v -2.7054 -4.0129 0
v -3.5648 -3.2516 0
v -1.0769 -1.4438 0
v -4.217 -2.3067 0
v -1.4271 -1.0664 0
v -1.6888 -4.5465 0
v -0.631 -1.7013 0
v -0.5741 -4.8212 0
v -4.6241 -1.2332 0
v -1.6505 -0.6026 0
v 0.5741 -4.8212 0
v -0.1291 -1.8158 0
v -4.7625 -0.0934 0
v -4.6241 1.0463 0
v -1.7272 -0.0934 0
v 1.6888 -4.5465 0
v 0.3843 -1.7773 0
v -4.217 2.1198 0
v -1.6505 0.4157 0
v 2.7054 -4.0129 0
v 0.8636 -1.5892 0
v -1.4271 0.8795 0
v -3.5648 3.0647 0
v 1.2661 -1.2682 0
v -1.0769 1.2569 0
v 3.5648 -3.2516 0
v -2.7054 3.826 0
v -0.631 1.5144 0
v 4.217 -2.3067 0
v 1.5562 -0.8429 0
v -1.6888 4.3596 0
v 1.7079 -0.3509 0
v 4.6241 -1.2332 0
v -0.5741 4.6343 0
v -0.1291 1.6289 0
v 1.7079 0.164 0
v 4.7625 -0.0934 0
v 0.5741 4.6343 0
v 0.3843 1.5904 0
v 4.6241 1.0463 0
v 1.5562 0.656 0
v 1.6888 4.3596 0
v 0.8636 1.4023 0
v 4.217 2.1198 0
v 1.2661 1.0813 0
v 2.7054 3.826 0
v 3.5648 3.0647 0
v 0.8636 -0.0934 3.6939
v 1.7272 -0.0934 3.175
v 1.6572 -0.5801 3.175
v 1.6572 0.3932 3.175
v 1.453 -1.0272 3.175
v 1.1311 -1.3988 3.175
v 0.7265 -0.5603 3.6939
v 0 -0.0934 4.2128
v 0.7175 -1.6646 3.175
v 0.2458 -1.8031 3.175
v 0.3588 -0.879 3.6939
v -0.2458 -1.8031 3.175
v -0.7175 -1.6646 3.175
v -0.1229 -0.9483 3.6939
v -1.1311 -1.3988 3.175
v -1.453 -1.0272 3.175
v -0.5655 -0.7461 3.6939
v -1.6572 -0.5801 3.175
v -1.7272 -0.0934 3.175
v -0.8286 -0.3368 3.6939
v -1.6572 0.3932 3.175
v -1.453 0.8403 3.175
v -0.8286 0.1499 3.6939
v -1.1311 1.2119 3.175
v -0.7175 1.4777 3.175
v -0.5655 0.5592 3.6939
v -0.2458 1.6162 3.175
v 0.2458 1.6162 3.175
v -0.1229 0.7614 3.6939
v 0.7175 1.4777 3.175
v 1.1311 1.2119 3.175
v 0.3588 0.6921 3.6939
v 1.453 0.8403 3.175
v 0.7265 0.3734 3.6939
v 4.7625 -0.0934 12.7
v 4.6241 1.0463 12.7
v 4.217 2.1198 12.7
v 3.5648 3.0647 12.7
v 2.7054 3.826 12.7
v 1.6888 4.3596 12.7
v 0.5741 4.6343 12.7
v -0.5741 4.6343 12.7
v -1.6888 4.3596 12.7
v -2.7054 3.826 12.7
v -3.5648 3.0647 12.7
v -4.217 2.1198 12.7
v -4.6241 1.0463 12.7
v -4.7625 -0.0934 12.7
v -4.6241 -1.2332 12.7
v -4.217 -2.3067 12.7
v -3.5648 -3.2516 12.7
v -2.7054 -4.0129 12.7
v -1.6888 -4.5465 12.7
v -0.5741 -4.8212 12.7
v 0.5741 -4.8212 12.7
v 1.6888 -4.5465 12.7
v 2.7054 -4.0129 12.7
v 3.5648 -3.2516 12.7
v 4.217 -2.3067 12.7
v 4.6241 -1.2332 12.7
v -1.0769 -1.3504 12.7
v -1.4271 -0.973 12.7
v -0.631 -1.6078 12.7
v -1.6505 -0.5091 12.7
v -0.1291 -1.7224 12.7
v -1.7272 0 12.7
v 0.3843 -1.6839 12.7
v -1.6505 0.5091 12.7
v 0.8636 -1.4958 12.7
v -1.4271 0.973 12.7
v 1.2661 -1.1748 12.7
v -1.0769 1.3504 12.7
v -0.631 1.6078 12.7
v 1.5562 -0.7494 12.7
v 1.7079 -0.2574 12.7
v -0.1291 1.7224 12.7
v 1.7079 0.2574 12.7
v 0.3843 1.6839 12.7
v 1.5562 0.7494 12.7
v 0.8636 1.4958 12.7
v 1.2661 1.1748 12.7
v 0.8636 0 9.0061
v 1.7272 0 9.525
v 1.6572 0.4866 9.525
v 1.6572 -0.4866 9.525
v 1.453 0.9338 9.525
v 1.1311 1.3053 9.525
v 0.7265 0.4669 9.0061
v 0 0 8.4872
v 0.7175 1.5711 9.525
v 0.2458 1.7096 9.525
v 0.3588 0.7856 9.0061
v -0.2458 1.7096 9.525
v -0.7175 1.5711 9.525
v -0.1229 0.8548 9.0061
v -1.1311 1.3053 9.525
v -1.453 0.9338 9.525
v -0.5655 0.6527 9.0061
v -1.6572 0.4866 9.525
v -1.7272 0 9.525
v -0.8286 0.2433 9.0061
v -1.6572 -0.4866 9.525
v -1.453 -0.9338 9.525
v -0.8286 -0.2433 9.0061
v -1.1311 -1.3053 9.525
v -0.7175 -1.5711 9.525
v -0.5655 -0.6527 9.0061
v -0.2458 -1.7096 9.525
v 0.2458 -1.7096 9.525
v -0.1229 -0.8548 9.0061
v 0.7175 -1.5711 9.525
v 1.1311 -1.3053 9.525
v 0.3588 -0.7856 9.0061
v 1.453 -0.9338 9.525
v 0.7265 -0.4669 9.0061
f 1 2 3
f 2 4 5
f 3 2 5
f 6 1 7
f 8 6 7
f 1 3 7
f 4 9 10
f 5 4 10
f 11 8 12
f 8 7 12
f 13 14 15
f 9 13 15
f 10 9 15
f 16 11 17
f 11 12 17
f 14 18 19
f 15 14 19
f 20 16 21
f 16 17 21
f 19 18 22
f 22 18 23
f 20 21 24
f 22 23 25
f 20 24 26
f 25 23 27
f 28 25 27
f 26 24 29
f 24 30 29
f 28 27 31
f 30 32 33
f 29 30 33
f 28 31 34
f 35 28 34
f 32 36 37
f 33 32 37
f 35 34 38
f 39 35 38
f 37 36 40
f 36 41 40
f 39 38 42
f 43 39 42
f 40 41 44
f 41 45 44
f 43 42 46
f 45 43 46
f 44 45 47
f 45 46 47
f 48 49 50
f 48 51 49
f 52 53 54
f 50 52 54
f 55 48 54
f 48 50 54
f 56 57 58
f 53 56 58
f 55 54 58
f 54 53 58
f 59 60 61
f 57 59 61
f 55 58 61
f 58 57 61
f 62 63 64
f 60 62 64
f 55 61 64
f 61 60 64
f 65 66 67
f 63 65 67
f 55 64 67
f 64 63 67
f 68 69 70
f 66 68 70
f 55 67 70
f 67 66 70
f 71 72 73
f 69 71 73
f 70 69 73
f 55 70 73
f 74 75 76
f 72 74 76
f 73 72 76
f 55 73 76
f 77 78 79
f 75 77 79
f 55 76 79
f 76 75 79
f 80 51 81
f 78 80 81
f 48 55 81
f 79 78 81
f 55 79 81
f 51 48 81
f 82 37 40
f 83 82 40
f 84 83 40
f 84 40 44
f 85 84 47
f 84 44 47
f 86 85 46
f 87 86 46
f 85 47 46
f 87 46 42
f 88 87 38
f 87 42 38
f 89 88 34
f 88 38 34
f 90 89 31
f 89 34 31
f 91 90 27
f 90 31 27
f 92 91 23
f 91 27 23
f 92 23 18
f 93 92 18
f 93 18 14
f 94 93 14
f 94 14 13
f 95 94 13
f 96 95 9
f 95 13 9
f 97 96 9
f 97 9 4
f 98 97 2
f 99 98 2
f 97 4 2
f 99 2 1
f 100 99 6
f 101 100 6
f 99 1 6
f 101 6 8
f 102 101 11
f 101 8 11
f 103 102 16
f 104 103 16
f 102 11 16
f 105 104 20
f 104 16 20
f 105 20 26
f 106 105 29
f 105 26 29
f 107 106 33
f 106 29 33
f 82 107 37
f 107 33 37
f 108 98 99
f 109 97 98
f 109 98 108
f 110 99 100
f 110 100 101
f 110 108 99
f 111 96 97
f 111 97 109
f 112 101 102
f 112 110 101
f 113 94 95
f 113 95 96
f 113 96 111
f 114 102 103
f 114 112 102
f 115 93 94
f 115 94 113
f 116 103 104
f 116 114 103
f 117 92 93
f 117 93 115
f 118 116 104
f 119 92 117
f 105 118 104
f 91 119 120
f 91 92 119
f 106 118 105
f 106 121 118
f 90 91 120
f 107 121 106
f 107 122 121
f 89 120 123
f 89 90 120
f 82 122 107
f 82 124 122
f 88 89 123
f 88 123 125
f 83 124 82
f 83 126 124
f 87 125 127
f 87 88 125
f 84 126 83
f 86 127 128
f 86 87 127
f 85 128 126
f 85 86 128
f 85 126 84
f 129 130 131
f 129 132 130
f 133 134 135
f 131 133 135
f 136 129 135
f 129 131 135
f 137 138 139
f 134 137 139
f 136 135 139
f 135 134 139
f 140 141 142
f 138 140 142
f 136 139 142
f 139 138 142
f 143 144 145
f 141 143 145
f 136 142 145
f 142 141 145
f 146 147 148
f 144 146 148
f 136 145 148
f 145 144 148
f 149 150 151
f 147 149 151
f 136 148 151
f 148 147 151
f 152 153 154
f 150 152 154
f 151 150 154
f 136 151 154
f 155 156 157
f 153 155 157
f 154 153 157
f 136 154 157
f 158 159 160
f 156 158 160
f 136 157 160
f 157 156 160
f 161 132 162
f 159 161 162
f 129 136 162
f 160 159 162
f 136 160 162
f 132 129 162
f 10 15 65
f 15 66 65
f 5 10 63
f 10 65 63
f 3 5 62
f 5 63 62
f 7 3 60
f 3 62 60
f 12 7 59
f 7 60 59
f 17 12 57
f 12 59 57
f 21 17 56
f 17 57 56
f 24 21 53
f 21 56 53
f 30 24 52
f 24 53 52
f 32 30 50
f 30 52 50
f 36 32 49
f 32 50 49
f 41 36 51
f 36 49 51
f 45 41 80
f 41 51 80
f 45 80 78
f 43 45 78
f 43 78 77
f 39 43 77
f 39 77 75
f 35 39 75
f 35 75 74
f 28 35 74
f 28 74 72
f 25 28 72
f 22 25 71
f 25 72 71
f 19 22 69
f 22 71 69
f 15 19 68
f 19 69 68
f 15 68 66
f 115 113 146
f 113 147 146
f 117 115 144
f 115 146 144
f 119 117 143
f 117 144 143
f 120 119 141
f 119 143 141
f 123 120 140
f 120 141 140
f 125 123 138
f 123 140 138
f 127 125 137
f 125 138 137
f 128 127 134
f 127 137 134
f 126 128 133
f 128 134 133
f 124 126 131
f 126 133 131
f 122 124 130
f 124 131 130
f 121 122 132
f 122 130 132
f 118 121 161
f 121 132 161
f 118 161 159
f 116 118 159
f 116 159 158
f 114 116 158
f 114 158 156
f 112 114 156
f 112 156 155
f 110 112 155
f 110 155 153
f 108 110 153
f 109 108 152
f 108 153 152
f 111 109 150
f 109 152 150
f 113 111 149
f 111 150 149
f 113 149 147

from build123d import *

# Parameters (mm, degrees)
F0_R     = 4.7625
F1_DEPTH = 12.7
F3_D     = 3.4544
F3_DEPTH = 3.175
F3_TIP   = 1.0378064612
F4_D     = 3.4544
F4_DEPTH = 3.175
F4_TIP   = 1.0378064612


with BuildPart() as f1:
    # F0 (on Top) → F1 (new body)
    with BuildSketch(Plane.XY):
        with Locations((0, -0.0934494074)):
            Circle(F0_R)
    extrude(amount=F1_DEPTH)

    # F3
    with Locations(Plane.XY.offset(12.7)):
        with Locations((0, 0)):
            Hole(F3_D / 2, depth=F3_DEPTH)
            with Locations((0, 0, -(F3_DEPTH + F3_TIP / 2))):  # 118° drill point
                Cone(0, F3_D / 2, F3_TIP, mode=Mode.SUBTRACT)

    # F4
    with Locations(Plane(origin=(0, 0, 0), x_dir=(1, 0, 0), z_dir=(0, 0, -1))):
        with Locations((0, 0.0934494074)):
            Hole(F4_D / 2, depth=F4_DEPTH)
            with Locations((0, 0, -(F4_DEPTH + F4_TIP / 2))):  # 118° drill point
                Cone(0, F4_D / 2, F4_TIP, mode=Mode.SUBTRACT)


solid = f1.part
